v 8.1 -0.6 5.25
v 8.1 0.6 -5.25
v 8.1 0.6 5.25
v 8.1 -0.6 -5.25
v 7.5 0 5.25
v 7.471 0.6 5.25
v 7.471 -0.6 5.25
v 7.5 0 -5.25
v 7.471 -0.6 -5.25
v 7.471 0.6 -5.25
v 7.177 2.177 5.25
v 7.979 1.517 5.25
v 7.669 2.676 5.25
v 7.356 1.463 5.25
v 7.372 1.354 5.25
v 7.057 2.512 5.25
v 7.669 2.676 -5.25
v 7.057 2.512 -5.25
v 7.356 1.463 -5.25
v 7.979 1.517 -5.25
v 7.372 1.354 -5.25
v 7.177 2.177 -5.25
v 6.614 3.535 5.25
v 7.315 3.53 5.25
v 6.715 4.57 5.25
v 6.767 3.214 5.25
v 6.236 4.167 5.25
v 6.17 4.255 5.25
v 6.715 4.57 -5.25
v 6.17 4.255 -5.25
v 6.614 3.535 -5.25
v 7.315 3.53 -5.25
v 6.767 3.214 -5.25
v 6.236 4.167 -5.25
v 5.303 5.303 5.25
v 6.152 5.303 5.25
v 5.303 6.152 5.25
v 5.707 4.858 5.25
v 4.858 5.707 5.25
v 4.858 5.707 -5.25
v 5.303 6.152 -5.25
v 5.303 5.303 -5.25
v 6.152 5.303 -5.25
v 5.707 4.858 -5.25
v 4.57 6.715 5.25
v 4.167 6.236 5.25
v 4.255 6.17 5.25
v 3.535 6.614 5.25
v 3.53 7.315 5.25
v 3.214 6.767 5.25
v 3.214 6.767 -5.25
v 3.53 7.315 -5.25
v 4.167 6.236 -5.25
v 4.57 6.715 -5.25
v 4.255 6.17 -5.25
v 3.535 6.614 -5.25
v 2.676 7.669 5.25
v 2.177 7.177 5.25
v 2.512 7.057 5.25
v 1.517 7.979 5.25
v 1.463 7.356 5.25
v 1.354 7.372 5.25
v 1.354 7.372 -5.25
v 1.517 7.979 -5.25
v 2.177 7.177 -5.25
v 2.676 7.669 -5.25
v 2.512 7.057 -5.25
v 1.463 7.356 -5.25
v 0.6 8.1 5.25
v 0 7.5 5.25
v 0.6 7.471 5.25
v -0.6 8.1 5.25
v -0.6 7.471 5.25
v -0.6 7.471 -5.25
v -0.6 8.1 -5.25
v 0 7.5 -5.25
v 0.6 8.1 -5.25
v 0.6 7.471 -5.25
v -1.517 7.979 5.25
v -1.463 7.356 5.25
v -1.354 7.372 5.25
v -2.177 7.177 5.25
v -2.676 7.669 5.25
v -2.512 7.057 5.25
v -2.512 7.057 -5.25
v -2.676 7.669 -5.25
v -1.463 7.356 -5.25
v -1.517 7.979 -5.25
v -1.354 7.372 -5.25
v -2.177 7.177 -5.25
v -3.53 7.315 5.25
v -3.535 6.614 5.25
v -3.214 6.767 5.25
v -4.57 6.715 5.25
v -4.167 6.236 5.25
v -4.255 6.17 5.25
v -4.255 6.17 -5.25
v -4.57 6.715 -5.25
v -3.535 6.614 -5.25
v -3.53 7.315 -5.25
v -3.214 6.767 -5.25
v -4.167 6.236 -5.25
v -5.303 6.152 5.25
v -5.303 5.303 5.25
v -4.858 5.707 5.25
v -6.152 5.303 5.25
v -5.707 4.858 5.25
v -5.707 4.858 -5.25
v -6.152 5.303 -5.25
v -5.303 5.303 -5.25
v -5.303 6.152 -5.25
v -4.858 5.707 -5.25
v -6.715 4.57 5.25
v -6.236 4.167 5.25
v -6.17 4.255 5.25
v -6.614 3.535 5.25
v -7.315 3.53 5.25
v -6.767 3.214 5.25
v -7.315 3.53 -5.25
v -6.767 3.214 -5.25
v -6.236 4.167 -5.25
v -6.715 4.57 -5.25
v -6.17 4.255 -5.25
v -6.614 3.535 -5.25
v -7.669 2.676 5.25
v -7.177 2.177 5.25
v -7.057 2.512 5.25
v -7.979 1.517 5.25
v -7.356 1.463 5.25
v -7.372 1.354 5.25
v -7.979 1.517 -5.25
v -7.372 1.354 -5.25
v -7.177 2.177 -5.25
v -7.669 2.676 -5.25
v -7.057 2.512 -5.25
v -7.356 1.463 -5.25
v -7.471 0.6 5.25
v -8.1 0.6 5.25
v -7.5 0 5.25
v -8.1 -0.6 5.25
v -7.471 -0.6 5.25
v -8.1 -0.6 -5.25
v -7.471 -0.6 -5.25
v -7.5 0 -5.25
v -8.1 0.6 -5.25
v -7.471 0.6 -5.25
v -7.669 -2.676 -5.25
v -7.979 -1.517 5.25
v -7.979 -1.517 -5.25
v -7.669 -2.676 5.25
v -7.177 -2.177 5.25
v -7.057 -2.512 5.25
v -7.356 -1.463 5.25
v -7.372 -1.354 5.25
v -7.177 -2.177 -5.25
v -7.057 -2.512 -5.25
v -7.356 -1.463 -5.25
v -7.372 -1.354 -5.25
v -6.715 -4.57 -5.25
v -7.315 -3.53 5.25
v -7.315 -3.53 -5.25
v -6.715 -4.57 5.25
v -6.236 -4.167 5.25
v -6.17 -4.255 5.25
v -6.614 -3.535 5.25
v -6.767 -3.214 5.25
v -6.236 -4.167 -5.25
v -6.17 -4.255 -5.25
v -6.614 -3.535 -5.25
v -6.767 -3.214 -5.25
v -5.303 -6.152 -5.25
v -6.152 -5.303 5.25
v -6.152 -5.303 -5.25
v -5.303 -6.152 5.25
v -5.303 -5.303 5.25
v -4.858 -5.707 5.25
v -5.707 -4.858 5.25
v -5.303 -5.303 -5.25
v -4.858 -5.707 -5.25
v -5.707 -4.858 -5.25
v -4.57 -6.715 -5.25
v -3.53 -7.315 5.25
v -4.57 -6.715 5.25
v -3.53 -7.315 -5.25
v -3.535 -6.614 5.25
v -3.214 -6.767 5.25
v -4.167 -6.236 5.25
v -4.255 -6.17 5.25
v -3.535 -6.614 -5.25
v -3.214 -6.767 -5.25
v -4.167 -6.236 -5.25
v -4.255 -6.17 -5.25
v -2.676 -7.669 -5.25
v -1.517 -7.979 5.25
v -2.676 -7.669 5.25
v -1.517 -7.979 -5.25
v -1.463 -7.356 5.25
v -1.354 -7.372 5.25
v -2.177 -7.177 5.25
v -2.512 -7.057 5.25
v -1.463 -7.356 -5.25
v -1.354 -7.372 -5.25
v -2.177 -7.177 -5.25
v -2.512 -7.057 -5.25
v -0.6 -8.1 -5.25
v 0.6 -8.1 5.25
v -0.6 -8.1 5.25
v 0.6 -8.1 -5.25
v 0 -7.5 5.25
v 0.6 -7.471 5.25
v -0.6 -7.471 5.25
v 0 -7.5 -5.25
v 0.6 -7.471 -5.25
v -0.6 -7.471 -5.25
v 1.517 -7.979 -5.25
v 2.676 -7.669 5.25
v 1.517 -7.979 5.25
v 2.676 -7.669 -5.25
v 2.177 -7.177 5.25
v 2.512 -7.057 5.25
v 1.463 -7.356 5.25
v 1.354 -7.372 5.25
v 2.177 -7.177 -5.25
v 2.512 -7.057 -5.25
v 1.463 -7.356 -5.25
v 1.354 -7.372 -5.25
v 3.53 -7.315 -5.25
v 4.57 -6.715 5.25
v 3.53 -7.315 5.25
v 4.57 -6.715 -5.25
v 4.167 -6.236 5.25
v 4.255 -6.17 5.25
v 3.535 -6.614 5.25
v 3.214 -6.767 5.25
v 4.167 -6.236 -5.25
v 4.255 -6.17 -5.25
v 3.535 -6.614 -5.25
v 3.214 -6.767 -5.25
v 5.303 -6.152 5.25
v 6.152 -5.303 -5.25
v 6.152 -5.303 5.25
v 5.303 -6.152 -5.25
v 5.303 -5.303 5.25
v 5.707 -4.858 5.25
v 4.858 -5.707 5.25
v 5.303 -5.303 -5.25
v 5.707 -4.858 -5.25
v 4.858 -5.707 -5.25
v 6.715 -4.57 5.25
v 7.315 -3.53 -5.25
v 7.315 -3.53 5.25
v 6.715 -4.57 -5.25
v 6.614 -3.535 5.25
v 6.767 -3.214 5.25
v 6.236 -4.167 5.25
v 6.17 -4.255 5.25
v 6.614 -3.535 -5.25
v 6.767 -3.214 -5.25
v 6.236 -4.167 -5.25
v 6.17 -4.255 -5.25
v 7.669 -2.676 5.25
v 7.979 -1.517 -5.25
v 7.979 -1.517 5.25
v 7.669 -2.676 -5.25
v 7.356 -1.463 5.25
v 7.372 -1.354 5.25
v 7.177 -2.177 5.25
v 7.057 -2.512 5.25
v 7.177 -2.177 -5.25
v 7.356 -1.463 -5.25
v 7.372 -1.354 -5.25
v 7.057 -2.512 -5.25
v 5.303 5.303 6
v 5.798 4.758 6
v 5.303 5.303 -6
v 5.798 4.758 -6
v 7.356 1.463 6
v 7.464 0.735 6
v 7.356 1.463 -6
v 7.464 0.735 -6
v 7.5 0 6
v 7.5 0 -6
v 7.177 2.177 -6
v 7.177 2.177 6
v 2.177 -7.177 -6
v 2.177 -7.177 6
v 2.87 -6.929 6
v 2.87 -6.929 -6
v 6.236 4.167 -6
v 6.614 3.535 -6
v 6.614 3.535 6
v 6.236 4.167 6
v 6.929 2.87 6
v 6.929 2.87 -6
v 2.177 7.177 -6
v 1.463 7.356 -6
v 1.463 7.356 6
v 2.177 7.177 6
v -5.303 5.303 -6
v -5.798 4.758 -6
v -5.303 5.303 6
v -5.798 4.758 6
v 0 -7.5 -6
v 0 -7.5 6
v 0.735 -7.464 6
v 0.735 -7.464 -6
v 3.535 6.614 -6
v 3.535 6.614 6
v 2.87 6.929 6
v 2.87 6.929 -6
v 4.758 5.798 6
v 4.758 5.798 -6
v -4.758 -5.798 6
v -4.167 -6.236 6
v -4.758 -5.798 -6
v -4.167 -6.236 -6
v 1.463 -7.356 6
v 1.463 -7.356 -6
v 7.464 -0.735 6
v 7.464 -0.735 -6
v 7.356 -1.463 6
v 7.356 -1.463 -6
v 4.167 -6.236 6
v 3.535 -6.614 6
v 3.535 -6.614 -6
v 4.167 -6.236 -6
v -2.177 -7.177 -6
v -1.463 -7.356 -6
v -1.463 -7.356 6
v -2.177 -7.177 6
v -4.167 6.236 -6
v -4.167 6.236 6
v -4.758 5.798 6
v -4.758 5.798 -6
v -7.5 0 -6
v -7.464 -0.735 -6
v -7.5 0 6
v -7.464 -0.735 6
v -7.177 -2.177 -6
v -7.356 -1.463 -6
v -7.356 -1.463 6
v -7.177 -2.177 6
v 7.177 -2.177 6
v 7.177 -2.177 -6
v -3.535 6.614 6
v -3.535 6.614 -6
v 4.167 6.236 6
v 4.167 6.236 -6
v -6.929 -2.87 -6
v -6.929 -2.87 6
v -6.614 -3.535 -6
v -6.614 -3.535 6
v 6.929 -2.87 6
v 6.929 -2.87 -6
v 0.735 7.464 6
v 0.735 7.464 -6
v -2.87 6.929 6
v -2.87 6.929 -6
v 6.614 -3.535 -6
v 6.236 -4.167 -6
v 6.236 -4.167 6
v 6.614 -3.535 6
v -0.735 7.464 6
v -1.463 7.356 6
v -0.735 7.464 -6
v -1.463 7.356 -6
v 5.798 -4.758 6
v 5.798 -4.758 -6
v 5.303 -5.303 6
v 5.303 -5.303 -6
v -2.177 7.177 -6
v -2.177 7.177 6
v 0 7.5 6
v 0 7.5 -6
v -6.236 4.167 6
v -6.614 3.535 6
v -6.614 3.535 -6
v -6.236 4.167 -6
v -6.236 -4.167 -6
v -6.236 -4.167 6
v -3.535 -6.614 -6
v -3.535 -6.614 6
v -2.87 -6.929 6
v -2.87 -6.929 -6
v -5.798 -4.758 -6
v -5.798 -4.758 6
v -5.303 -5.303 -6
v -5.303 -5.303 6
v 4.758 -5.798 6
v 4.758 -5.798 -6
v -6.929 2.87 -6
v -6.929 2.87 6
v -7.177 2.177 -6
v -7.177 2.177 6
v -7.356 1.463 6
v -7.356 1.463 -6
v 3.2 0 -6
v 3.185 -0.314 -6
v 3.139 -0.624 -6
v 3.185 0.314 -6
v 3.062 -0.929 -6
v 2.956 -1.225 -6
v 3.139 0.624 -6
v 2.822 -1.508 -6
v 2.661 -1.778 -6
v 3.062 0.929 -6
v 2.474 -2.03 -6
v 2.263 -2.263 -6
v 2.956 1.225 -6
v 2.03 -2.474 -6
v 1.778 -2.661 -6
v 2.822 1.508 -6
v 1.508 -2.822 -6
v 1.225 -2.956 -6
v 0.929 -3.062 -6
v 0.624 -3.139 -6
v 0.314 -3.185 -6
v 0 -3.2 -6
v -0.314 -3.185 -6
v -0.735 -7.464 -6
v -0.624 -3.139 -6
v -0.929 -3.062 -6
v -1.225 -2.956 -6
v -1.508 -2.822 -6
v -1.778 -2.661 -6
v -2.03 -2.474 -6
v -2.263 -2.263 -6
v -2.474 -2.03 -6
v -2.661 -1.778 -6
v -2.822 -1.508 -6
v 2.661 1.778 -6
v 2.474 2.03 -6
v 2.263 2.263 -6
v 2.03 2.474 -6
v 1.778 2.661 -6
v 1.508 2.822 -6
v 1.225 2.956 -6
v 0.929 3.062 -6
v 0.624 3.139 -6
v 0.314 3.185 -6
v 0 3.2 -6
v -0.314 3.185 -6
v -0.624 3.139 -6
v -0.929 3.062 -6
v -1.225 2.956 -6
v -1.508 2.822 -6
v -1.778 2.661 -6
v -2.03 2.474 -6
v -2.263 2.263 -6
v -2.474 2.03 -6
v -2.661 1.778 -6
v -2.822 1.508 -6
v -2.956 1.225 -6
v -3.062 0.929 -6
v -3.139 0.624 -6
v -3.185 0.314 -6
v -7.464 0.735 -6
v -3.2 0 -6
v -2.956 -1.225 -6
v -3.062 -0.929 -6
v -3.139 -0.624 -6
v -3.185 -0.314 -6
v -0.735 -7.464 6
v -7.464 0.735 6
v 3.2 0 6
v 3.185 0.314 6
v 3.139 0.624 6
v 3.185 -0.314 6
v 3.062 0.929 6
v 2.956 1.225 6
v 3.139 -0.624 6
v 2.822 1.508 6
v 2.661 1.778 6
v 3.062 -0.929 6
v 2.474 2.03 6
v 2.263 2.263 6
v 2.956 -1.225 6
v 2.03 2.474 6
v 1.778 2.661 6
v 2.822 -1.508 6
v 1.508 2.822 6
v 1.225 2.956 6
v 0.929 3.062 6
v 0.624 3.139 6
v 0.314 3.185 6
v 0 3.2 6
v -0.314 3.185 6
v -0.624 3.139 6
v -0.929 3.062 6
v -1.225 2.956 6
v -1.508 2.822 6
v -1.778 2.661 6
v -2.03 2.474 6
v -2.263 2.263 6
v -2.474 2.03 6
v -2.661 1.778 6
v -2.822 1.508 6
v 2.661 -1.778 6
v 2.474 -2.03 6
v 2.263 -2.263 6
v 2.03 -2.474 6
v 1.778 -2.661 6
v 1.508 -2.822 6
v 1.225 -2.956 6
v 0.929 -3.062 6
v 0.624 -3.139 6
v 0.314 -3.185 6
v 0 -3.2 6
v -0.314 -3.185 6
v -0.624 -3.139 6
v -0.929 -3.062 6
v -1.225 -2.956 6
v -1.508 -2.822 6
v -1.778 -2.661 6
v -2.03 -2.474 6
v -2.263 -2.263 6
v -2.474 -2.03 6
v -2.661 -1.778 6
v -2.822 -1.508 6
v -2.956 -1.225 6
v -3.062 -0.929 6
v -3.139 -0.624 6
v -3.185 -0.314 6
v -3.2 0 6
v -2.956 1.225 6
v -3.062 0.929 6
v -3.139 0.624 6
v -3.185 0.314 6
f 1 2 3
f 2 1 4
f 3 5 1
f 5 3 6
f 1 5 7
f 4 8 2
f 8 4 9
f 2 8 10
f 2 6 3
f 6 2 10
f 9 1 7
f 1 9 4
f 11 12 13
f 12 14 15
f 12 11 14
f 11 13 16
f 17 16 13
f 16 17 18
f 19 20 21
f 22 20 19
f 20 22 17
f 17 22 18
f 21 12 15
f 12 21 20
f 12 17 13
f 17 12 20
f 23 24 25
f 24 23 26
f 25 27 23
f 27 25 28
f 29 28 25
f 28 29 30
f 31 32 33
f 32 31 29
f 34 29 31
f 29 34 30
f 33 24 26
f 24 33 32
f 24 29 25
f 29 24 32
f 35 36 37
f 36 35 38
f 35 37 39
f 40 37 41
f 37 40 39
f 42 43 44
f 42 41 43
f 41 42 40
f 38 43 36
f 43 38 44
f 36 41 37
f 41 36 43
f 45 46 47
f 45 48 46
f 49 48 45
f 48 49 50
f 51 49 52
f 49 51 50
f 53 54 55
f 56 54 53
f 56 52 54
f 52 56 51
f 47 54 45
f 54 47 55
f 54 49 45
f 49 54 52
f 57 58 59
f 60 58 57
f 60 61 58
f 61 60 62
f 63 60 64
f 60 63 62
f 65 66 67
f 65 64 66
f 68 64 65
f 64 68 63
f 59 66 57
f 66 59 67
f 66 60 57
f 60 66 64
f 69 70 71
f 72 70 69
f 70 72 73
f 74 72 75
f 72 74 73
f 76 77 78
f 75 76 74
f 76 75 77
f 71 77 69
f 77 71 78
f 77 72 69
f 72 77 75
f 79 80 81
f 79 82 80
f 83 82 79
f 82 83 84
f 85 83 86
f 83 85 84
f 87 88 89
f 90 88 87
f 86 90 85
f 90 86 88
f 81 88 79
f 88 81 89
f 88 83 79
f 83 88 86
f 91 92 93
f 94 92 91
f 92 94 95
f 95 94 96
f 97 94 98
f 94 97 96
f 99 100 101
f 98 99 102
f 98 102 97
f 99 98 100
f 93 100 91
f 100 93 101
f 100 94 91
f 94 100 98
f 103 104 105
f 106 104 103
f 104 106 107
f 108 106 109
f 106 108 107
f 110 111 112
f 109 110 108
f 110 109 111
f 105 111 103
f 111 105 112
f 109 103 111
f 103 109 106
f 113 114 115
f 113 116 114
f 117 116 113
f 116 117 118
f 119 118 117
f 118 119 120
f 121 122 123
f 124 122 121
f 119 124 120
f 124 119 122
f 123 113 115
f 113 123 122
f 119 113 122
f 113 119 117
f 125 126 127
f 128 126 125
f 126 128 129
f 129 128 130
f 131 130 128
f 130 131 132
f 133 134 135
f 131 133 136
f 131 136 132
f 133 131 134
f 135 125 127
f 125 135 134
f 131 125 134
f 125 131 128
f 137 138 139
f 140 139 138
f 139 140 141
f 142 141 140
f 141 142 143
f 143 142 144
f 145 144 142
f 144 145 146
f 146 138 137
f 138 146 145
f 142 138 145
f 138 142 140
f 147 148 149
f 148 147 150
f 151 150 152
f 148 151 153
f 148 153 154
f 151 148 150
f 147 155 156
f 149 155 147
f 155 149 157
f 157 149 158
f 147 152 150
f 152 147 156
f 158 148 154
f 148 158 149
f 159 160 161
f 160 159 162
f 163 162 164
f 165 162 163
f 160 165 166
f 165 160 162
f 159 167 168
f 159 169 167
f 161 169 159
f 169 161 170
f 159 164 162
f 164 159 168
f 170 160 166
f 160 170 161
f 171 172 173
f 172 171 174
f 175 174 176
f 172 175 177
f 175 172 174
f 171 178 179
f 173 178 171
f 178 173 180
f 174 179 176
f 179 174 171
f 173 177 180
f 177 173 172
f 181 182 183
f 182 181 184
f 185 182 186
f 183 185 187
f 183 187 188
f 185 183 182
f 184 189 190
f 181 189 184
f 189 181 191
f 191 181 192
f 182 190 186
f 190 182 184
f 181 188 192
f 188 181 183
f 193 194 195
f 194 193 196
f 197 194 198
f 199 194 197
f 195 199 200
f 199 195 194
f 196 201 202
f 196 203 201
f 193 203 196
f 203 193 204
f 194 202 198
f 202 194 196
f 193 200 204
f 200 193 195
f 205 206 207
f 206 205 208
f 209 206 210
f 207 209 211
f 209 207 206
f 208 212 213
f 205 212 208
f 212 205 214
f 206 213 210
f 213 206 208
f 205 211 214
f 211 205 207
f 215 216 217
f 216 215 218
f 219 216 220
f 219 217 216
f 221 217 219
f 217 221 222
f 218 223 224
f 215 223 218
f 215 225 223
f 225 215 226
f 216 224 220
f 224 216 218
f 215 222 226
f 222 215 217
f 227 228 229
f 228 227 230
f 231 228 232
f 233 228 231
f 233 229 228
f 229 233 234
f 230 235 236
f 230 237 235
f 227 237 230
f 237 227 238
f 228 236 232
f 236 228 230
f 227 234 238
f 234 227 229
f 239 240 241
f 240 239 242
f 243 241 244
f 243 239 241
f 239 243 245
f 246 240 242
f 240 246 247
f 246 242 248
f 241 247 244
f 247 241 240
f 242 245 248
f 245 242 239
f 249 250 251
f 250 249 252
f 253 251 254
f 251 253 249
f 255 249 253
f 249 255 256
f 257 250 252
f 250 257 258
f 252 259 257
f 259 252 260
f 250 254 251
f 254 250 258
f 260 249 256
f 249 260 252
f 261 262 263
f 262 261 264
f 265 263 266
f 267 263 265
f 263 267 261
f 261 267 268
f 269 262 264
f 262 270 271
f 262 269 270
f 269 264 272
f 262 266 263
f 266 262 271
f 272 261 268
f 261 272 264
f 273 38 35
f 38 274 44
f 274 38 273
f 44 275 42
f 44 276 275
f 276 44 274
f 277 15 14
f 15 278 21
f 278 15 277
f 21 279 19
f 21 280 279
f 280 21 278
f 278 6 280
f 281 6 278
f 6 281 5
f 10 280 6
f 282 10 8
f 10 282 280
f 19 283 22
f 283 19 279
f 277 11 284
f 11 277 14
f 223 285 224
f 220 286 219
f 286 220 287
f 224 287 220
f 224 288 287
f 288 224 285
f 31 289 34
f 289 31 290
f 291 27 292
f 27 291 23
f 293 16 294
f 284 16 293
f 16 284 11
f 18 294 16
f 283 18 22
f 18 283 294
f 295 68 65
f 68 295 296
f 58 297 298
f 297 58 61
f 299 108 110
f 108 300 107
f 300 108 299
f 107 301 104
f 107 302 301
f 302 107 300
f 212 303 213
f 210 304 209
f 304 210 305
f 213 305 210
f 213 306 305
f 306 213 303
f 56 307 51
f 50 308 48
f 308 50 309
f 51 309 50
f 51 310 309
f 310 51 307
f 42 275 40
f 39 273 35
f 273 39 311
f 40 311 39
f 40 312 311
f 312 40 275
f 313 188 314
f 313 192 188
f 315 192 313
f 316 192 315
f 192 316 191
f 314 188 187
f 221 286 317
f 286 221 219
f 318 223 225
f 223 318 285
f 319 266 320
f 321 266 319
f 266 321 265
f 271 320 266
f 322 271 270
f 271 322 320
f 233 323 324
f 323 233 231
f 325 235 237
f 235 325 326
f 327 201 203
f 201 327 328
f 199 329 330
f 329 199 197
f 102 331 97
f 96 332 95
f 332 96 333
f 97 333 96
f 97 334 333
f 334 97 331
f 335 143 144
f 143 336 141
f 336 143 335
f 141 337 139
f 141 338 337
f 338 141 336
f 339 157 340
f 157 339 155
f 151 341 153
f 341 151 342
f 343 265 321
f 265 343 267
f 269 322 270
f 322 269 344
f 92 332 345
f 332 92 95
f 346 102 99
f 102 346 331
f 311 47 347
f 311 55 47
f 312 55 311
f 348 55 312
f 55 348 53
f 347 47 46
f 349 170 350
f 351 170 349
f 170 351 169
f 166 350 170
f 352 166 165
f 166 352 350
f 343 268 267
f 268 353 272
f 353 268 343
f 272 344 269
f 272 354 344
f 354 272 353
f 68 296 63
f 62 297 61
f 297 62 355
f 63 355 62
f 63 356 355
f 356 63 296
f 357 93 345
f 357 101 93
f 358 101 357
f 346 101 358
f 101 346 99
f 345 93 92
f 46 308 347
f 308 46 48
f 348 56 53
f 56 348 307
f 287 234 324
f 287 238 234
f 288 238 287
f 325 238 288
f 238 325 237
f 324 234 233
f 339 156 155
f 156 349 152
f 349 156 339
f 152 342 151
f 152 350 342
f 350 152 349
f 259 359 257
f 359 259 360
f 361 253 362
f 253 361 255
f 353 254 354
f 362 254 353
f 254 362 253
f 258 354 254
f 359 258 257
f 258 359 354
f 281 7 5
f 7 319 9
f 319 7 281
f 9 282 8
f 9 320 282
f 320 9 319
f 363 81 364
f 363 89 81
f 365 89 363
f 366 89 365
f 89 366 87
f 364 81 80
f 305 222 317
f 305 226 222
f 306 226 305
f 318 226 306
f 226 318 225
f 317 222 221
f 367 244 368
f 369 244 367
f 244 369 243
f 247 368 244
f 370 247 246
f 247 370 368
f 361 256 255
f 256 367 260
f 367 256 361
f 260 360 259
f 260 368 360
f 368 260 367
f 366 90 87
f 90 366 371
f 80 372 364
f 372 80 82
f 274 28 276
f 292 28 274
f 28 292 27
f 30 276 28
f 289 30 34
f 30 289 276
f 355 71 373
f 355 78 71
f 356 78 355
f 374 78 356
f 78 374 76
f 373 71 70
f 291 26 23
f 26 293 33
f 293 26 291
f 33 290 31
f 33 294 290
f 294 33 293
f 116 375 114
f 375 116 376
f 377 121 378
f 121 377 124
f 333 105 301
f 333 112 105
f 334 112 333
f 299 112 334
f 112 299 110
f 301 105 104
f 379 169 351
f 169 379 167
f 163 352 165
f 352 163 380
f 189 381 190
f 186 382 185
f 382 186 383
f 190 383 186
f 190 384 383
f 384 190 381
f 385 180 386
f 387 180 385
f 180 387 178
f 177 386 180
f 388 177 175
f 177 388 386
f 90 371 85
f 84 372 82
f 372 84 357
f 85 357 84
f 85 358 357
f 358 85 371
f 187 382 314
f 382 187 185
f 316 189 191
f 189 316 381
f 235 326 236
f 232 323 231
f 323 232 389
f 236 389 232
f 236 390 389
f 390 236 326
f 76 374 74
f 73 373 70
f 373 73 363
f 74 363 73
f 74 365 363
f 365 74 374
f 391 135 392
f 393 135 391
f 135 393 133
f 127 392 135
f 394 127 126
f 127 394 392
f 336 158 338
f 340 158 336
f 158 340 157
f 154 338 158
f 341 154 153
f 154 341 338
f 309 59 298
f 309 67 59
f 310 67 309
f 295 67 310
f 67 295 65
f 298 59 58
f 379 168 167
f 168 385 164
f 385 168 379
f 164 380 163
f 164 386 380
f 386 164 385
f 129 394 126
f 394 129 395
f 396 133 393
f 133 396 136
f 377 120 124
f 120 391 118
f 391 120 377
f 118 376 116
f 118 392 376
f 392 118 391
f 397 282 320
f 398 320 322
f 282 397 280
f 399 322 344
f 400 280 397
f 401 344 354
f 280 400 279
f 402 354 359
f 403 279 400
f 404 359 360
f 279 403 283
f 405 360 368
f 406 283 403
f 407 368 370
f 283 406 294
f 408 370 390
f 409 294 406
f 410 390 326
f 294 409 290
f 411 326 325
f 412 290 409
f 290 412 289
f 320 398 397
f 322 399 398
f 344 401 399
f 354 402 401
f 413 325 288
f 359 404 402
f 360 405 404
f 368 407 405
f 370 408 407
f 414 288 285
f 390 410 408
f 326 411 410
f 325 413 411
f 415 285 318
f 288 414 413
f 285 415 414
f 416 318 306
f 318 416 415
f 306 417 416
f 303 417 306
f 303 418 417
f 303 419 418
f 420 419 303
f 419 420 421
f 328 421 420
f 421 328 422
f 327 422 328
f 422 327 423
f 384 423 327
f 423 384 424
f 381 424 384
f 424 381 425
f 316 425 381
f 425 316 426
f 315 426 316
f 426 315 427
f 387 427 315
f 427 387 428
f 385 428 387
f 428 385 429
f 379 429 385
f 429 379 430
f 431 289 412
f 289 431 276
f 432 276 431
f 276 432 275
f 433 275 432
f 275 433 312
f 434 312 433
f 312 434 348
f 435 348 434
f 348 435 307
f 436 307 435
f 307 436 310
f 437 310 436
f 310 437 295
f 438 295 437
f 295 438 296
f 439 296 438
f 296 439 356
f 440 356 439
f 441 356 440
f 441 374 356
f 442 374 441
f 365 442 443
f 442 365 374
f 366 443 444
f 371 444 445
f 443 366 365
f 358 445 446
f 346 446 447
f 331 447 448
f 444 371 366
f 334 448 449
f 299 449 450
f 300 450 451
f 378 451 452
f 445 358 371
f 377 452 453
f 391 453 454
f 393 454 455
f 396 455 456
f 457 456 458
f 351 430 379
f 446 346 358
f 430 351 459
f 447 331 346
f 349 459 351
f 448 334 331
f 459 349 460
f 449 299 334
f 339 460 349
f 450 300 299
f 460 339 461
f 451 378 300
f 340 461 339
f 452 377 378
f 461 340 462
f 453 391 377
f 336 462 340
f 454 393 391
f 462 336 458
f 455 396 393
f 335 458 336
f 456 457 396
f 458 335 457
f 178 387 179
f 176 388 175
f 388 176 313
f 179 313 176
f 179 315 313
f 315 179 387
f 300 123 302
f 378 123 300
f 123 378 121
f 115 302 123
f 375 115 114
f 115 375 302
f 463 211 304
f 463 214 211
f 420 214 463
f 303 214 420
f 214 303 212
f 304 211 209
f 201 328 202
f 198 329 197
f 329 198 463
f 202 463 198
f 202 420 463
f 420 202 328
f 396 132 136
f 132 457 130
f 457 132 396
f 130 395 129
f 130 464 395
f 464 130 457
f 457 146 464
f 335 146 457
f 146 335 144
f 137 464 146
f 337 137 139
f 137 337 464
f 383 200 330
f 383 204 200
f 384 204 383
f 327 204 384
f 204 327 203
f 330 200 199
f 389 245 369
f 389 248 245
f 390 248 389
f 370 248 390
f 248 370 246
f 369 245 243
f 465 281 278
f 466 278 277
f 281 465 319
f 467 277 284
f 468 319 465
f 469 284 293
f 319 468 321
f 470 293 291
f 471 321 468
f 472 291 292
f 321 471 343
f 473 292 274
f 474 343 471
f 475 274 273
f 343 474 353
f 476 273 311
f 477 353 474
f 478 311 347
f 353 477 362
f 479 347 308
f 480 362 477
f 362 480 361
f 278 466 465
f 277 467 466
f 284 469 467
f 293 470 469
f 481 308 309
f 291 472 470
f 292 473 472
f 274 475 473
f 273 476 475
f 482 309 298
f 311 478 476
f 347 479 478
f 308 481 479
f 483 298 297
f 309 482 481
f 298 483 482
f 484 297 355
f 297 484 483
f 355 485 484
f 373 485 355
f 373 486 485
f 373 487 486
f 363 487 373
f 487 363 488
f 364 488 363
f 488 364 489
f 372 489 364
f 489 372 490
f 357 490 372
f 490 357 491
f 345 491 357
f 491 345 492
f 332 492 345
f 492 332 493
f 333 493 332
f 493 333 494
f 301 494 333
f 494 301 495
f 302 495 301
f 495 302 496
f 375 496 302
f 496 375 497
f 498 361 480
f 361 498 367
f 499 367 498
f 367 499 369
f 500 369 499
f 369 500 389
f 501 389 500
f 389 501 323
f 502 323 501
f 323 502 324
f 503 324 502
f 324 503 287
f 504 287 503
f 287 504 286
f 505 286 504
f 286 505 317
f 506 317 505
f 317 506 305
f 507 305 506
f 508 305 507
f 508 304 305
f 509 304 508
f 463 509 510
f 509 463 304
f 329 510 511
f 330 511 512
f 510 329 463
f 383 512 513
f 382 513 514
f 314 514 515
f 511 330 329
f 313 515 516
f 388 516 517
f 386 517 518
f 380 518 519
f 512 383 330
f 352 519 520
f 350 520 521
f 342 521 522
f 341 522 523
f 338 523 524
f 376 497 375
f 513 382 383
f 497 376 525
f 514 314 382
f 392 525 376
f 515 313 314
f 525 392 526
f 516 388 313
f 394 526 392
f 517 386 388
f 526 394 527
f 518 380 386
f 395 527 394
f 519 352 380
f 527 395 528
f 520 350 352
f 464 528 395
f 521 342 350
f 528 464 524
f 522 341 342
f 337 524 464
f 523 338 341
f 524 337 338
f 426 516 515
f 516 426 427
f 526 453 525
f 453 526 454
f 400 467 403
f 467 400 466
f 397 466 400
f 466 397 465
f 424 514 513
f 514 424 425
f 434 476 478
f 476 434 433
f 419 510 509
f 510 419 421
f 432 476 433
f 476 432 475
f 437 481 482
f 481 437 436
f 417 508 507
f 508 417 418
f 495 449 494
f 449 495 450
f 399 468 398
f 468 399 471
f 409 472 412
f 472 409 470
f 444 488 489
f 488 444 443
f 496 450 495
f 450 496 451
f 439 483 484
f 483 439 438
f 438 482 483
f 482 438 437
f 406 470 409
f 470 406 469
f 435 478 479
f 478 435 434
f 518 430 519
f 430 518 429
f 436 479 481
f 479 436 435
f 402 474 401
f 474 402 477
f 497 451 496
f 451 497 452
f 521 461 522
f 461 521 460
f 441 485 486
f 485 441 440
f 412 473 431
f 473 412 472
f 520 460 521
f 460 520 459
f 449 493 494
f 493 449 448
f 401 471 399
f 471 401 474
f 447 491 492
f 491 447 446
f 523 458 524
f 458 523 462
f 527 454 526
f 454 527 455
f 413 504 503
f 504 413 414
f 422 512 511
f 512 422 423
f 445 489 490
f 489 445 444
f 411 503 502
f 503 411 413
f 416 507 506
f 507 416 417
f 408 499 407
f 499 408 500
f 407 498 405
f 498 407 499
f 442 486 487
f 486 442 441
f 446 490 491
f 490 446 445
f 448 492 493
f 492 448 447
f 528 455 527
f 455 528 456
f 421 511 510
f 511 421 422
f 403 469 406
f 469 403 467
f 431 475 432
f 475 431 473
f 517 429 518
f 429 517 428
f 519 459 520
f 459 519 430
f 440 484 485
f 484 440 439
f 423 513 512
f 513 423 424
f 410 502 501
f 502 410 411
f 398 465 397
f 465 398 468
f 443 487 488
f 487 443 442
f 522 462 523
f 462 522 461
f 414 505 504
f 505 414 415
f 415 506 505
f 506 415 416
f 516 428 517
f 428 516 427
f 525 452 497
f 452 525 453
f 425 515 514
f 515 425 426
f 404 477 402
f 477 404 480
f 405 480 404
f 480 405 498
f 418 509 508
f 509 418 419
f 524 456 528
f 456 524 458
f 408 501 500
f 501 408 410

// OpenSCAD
// Parameters
outer_diameter_mm = 15; //[7.5:30:0.1]
length_mm = 12; //[6:24:0.1]
screw_diameter_mm = 6; //[3:12:0.1]
thread_clearance_mm = 0.4; //[0.1:1:0.05]
chamfer_mm = 0.5; //[0.2:2:0.1]
rib_count = 24; //[8:60:1]
rib_radial_height_mm = 0.6; //[0.2:1.5:0.05]
rib_tangential_width_mm = 1.2; //[0.5:3:0.1]
rib_length_mm = 10.5; //[5:22:0.1]
rib_end_margin_mm = 0.75; //[0.3:2:0.05]
overlap_mm = 1; //[0.5:2:0.1]

// Module for the heat-set insert
module insert() {
  color("Brass") {
    // Main body
    cylinder(r=outer_diameter_mm/2, h=length_mm, center=true, $fn=64);
    
    // Lead-in chamfer
    translate([0, 0, length_mm/2 - chamfer_mm/2])
      cylinder(r1=outer_diameter_mm/2, r2=outer_diameter_mm/2 - chamfer_mm, h=chamfer_mm, center=true, $fn=64);
    
    // Installation end chamfer
    translate([0, 0, -length_mm/2 + chamfer_mm/2])
      cylinder(r1=outer_diameter_mm/2 - chamfer_mm, r2=outer_diameter_mm/2, h=chamfer_mm, center=true, $fn=64);
    
    // Ribs
    for (i = [0:rib_count-1]) {
      rotate([0, 0, i*360/rib_count])
        translate([outer_diameter_mm/2 - overlap_mm + (rib_radial_height_mm + overlap_mm)/2, 0, 0])
        cube([rib_radial_height_mm + overlap_mm, rib_tangential_width_mm, rib_length_mm], center=true);
    }
  }
}

// Module for the threaded insert
module threaded_insert() {
  difference() {
    insert();
    // Internal thread bore
    color("Silver") {
      cylinder(r=(screw_diameter_mm + thread_clearance_mm)/2, h=length_mm + 2*overlap_mm, center=true, $fn=64);
    }
  }
}

// Assembly of the insert
module assembly() {
  threaded_insert();
}

assembly();
